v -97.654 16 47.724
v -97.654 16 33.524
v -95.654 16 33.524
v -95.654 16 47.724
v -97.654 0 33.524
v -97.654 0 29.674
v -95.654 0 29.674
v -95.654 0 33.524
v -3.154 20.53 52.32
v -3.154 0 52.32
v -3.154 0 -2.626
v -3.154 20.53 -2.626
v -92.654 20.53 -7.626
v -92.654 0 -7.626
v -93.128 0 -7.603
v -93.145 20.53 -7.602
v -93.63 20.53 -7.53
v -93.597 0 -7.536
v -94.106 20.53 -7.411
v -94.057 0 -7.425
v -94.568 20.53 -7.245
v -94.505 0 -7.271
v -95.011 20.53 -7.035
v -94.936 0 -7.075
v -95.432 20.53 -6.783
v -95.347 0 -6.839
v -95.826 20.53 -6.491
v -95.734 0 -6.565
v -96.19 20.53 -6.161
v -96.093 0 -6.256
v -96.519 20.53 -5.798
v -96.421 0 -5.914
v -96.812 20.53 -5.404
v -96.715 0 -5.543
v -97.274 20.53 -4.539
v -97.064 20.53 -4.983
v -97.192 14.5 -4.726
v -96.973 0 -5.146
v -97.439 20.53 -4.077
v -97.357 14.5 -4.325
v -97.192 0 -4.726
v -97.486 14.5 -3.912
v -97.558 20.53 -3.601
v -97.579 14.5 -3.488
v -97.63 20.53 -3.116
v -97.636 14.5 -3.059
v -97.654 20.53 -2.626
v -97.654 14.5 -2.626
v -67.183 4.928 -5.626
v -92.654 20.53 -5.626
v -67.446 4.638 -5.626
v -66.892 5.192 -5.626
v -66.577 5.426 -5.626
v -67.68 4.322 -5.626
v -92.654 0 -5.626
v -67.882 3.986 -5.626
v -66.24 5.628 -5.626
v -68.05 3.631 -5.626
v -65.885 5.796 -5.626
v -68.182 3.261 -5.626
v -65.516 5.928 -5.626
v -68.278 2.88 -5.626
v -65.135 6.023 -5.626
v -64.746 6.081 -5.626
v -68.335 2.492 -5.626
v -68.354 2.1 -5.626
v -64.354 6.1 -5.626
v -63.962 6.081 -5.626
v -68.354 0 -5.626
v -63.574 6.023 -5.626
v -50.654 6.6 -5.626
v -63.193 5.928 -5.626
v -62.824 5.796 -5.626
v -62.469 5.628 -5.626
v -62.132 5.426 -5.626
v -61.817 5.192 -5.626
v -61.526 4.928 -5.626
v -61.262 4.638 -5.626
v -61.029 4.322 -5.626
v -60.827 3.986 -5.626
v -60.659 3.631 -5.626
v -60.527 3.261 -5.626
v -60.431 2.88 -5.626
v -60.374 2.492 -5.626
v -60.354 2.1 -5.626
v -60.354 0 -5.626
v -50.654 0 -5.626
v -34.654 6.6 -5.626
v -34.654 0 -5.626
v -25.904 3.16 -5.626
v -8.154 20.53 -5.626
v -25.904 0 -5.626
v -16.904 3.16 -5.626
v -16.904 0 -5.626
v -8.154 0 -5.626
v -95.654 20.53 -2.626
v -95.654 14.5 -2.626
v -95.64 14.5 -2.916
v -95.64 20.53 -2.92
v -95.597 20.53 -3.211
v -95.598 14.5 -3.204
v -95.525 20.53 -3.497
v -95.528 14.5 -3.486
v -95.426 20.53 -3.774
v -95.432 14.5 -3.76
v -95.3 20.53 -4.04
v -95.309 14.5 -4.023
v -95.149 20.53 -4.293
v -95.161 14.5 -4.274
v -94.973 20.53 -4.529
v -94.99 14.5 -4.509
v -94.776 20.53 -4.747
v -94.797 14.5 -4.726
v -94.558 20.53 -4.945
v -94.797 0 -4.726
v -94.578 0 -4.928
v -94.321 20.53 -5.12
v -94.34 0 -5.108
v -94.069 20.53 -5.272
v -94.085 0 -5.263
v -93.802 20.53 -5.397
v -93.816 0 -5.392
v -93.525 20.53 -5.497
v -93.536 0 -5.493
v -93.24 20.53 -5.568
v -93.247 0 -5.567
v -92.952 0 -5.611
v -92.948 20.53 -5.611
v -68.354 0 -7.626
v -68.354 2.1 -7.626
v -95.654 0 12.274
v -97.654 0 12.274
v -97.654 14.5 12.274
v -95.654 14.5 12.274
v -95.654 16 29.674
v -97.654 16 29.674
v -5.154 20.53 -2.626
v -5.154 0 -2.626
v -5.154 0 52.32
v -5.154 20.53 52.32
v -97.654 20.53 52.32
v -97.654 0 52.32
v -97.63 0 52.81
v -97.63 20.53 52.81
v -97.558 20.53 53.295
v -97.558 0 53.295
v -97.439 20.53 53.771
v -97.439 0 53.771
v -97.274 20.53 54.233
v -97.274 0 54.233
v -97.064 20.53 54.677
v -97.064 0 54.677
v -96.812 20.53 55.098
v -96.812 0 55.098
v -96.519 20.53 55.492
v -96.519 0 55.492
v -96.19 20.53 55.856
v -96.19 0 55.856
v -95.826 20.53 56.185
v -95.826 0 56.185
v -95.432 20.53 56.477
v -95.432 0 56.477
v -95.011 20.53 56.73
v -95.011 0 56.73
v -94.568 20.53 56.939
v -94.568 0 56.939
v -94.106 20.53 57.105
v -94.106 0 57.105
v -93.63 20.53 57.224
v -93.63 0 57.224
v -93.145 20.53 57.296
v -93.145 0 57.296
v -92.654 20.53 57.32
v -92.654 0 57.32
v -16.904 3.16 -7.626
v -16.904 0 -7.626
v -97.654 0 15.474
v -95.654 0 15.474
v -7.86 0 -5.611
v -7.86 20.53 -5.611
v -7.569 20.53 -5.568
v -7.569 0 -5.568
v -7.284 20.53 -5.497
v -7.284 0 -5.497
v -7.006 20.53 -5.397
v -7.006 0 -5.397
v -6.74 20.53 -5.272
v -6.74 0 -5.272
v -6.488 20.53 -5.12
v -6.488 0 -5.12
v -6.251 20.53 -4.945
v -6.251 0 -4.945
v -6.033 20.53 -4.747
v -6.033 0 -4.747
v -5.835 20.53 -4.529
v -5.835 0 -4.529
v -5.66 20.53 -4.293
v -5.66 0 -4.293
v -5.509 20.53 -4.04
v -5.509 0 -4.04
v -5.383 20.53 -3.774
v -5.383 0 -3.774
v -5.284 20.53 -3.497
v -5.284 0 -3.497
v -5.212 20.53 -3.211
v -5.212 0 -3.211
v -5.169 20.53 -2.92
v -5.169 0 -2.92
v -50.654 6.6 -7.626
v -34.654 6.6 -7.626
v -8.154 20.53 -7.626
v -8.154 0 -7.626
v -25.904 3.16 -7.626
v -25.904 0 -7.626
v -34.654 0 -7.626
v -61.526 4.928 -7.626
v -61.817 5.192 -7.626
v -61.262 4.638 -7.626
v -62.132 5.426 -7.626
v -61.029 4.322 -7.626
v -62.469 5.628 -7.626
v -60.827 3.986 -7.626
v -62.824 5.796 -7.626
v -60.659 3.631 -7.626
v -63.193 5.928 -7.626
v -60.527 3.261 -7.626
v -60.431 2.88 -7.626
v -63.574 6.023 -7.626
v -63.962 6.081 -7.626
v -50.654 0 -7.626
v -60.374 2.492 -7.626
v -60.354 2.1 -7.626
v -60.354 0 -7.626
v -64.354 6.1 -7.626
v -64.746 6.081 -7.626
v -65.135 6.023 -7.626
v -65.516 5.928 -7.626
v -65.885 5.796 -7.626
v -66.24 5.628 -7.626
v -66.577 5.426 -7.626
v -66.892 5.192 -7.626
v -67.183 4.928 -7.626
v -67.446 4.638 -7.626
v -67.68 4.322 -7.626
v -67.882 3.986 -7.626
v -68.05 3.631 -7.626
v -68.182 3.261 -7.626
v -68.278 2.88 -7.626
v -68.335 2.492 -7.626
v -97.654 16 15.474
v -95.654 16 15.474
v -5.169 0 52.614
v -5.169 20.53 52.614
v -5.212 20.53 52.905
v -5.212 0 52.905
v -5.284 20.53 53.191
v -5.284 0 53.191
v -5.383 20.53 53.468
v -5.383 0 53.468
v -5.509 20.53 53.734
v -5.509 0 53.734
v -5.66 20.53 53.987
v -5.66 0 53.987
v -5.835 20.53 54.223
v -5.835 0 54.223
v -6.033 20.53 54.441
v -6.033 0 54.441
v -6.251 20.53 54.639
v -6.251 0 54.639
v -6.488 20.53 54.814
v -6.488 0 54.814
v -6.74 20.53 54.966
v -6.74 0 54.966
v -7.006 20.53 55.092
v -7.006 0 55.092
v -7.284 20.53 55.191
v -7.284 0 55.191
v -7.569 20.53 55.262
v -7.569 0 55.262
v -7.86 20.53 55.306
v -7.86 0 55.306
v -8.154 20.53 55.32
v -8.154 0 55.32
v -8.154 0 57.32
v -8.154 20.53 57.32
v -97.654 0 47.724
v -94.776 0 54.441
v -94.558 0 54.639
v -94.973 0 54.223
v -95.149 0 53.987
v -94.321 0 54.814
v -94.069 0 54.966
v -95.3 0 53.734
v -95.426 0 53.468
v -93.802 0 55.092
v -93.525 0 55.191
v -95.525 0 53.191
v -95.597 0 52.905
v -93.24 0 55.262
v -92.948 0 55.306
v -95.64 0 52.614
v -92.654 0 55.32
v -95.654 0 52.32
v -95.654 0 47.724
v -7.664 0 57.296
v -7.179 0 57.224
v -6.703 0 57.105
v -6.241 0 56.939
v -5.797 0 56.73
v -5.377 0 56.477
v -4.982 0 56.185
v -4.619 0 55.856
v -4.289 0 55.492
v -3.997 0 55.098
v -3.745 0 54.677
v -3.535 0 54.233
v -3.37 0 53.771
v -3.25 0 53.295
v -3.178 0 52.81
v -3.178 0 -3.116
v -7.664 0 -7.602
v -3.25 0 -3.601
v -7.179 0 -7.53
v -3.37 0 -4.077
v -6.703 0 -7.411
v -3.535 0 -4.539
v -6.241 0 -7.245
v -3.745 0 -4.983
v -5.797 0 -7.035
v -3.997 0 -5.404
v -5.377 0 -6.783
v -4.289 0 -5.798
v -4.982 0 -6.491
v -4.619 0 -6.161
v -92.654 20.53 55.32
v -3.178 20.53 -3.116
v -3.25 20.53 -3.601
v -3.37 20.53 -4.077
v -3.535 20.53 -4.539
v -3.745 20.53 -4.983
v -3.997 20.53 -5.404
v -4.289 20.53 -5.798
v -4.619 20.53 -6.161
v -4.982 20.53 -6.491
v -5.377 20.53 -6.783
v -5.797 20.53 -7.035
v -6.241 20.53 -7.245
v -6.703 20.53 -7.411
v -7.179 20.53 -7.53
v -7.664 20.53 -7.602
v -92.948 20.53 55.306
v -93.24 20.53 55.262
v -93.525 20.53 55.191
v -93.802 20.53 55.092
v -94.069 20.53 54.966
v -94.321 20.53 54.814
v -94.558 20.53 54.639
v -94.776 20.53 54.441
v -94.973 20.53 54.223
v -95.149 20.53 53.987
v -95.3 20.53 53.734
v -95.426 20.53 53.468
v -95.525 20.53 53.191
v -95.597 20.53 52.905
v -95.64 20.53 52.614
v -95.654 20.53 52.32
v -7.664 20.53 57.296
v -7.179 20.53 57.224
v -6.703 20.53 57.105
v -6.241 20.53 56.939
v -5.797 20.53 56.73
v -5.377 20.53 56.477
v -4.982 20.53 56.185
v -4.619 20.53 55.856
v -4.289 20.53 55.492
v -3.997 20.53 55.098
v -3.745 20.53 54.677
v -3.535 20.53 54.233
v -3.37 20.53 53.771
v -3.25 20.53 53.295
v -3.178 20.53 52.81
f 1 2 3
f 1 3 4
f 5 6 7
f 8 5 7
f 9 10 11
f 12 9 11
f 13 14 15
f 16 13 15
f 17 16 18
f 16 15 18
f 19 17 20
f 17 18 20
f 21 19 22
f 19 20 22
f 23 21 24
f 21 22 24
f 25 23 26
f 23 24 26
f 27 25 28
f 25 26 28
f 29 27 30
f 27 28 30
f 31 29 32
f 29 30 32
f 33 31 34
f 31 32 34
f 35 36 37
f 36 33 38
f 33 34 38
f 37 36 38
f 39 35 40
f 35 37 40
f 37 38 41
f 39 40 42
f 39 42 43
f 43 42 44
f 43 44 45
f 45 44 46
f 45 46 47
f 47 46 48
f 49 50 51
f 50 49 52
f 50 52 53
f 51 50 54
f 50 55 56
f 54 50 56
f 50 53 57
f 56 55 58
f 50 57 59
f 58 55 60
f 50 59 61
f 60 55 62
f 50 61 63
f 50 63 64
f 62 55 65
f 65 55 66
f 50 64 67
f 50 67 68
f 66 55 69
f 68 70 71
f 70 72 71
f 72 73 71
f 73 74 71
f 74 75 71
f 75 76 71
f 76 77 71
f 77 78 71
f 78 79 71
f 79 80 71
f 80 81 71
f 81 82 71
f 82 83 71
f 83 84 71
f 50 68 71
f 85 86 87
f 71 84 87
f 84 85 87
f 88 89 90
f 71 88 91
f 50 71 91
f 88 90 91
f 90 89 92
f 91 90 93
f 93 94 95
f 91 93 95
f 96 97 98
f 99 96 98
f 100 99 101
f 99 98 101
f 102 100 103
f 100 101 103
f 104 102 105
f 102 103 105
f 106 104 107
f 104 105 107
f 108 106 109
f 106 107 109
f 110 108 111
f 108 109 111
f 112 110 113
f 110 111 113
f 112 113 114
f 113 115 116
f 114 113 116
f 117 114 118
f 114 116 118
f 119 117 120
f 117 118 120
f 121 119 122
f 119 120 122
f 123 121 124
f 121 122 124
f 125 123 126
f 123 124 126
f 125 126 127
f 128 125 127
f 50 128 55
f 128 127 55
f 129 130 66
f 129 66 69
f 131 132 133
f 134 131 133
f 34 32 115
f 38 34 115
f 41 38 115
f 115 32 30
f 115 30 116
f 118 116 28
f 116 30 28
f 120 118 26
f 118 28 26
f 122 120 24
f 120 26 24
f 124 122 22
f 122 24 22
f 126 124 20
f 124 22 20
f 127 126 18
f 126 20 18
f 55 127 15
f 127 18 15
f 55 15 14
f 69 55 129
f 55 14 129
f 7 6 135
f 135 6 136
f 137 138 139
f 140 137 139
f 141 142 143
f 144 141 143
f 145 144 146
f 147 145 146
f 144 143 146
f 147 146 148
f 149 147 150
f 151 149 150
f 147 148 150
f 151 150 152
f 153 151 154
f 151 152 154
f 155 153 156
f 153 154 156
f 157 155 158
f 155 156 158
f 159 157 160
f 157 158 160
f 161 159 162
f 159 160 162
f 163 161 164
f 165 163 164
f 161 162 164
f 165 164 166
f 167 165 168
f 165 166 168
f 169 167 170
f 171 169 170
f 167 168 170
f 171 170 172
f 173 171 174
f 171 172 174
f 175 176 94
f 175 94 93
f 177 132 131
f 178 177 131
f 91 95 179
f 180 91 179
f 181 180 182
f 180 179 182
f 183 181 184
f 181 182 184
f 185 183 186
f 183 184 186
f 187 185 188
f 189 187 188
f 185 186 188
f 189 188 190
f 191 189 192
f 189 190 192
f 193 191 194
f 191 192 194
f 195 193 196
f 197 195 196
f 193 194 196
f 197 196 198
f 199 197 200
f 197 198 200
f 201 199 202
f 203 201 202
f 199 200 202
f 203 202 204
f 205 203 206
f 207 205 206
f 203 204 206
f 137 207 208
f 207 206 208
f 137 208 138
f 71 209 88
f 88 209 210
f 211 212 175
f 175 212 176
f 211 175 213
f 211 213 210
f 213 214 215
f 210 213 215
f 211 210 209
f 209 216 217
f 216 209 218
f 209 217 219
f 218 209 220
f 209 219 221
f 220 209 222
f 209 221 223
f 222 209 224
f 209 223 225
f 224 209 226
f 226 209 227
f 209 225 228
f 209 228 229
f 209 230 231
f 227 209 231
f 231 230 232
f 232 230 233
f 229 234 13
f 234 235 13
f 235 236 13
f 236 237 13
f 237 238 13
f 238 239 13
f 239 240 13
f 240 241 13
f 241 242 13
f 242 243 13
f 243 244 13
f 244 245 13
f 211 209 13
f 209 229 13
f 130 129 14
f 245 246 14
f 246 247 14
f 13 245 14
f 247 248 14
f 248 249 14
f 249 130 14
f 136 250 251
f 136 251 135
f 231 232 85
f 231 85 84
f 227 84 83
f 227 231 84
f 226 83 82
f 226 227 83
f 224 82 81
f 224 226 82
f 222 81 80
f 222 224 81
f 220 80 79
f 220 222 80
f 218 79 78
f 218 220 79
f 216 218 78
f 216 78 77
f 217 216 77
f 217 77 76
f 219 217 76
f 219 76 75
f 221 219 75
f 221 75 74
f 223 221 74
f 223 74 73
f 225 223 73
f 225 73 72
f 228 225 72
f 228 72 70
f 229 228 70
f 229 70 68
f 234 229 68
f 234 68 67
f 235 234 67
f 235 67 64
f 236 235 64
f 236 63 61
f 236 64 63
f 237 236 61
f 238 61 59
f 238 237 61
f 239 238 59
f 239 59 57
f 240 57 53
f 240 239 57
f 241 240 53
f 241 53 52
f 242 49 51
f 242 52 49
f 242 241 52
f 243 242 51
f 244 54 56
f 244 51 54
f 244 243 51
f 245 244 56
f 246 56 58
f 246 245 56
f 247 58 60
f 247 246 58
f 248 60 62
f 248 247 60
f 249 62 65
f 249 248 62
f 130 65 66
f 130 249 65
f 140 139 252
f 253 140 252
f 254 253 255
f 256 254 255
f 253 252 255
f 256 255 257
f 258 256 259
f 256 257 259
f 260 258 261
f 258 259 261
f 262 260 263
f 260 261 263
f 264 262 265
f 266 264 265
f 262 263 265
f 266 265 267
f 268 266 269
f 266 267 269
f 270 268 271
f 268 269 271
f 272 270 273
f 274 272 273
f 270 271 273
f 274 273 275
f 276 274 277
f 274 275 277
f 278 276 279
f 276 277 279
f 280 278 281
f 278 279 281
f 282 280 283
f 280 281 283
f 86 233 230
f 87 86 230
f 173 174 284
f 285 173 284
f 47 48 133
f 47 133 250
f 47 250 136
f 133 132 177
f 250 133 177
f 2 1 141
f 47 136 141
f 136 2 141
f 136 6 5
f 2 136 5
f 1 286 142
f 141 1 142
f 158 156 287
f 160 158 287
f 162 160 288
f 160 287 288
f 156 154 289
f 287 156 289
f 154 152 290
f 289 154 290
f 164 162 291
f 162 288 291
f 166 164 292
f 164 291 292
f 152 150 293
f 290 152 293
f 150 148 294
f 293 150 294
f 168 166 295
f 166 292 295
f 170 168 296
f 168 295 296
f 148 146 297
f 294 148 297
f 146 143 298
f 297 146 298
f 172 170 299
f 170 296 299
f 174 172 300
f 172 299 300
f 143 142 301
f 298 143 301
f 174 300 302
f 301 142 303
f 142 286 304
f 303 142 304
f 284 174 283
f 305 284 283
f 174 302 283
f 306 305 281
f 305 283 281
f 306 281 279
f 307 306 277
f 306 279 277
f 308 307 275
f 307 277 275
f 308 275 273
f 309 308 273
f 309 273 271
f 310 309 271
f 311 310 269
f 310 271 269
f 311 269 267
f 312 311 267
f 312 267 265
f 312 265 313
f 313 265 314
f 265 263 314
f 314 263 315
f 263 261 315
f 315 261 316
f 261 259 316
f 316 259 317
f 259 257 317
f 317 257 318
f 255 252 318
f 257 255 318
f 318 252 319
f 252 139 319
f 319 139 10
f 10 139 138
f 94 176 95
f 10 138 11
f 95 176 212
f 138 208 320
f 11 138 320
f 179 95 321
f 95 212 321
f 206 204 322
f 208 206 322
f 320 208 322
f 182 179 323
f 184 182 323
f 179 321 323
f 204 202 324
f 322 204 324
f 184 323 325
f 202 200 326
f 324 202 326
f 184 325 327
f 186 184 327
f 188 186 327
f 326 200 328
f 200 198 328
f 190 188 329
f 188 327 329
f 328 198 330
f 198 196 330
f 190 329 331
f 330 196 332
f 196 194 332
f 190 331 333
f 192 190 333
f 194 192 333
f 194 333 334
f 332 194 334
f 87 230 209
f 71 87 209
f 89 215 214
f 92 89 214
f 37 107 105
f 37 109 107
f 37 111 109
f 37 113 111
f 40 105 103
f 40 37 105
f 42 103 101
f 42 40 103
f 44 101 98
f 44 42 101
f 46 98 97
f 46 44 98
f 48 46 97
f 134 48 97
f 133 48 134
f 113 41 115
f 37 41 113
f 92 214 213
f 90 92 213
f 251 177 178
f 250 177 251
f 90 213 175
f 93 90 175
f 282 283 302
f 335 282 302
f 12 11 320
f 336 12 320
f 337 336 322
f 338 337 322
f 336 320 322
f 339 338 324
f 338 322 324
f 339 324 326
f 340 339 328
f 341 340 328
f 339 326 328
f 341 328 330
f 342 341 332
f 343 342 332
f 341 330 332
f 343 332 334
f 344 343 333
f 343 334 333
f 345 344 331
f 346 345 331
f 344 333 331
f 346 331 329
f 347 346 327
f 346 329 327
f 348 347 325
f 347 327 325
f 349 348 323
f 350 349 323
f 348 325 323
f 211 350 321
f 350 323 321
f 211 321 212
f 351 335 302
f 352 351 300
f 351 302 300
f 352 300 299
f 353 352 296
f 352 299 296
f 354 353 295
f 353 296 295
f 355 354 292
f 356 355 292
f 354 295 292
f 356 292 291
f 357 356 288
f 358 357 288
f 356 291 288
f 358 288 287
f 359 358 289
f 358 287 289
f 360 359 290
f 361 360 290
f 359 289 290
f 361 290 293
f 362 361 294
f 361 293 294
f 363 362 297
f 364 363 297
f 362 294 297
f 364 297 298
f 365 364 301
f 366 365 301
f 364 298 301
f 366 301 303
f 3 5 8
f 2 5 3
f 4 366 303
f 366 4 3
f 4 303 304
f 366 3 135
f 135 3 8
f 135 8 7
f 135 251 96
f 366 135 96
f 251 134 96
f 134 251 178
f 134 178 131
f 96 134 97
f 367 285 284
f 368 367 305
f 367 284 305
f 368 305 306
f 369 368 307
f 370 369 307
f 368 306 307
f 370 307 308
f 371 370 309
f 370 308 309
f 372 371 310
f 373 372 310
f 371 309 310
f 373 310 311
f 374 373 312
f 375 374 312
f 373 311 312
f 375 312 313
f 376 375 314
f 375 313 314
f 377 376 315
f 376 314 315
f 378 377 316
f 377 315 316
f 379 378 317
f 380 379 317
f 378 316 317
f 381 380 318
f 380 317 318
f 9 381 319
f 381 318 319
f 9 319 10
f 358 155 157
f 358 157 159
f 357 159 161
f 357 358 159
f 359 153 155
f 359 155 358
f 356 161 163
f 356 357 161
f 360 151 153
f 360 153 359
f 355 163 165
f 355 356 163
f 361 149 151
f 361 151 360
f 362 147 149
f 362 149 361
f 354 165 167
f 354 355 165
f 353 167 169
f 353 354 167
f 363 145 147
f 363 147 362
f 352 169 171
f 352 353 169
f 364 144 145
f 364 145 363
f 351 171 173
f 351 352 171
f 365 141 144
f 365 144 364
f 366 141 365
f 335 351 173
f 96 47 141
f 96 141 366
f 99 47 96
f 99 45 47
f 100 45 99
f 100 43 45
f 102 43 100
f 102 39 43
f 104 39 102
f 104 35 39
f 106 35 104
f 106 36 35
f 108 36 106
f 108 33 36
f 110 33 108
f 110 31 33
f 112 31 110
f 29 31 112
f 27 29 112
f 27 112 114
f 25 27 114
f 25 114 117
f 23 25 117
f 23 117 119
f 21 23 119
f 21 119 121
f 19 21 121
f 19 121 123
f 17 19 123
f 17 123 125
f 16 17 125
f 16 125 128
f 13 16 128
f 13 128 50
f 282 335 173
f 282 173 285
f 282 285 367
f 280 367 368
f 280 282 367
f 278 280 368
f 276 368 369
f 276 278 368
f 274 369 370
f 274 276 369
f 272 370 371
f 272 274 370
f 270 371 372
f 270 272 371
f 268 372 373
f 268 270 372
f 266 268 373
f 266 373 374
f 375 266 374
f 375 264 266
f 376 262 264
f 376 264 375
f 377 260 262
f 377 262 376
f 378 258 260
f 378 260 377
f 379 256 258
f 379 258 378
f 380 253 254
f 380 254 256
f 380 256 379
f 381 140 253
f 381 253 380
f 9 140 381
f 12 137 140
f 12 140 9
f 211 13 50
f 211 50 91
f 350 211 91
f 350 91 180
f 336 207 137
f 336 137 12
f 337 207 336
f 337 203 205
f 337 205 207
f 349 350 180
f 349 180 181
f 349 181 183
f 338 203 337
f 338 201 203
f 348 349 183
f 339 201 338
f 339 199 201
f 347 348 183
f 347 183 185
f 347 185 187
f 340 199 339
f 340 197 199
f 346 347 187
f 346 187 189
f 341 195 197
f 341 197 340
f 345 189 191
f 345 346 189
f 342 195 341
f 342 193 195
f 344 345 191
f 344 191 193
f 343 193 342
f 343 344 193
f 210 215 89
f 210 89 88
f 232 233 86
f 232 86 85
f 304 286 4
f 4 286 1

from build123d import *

# Parameters (mm, degrees)
BOSS_EXTRUDE1_DEPTH = 20.53
CUT_EXTRUDE1_REACH  = 112.841
SKETCH2_W           = 17
SKETCH2_H           = 14.5
SKETCH2_W_2         = 14.2
SKETCH2_H_2         = 16
CUT_EXTRUDE2_REACH  = 121.062
SKETCH3_W           = 9
SKETCH3_H           = 3.16
SKETCH3_W_2         = 16
SKETCH3_H_2         = 6.6


with BuildPart() as part:
    # Sketch1 → Boss-Extrude1 (new body)
    with BuildSketch(Plane(origin=(0, 0, 0), x_dir=(1, 0, 0), z_dir=(0, 1, 0))):
        with BuildLine():
            Line((-97.654422032, 2.625826009), (-97.654422032, -52.319988394))
            ThreePointArc((-97.654422032, -52.319988394), (-96.189955938, -55.8555223), (-92.654422032, -57.319988394))
            Line((-92.654422032, -57.319988394), (-8.154422032, -57.319988394))
            ThreePointArc((-8.154422032, -57.319988394), (-4.618888126, -55.8555223), (-3.154422032, -52.319988394))
            Line((-3.154422032, -52.319988394), (-3.154422032, 2.625826009))
            ThreePointArc((-3.154422032, 2.625826009), (-4.618888126, 6.161359915), (-8.154422032, 7.625826009))
            Line((-8.154422032, 7.625826009), (-92.654422032, 7.625826009))
            ThreePointArc((-92.654422032, 7.625826009), (-96.189955938, 6.161359915), (-97.654422032, 2.625826009))
        make_face()
        with BuildLine():
            Line((-92.654422032, 5.625826009), (-8.154422032, 5.625826009))
            ThreePointArc((-8.154422032, 5.625826009), (-6.033101689, 4.747146353), (-5.154422032, 2.625826009))
            Line((-5.154422032, 2.625826009), (-5.154422032, -52.319988394))
            ThreePointArc((-5.154422032, -52.319988394), (-6.033101689, -54.441308738), (-8.154422032, -55.319988394))
            Line((-8.154422032, -55.319988394), (-92.654422032, -55.319988394))
            ThreePointArc((-92.654422032, -55.319988394), (-94.775742376, -54.441308738), (-95.654422032, -52.319988394))
            Line((-95.654422032, -52.319988394), (-95.654422032, 2.625826009))
            ThreePointArc((-95.654422032, 2.625826009), (-94.775742376, 4.747146353), (-92.654422032, 5.625826009))
        make_face(mode=Mode.SUBTRACT)
    extrude(amount=BOSS_EXTRUDE1_DEPTH)

    # Sketch2 → Cut-Extrude1 (cut, up to next)
    with BuildSketch(Plane(origin=(-97.654422032, 0, 3.154422032), x_dir=(0, 0, 1), z_dir=(-1, 0, 0)), mode=Mode.PRIVATE) as cut_extrude1_sk1:
        with Locations((0.619751959, 7.25)):
            Rectangle(SKETCH2_W, SKETCH2_H)
    cut_extrude1_tool1 = extrude(cut_extrude1_sk1.sketch, amount=-CUT_EXTRUDE1_REACH, mode=Mode.PRIVATE) & part.part
    # Sketch2 → Cut-Extrude1 (cut, up to next)
    with BuildSketch(Plane(origin=(-97.654422032, 0, 3.154422032), x_dir=(0, 0, 1), z_dir=(-1, 0, 0)), mode=Mode.PRIVATE) as cut_extrude1_sk2:
        with Locations((19.419751959, 8)):
            Rectangle(SKETCH2_W_2, SKETCH2_H_2)
    cut_extrude1_tool2 = extrude(cut_extrude1_sk2.sketch, amount=-CUT_EXTRUDE1_REACH, mode=Mode.PRIVATE) & part.part
    # Sketch2 → Cut-Extrude1 (cut, up to next)
    with BuildSketch(Plane(origin=(-97.654422032, 0, 3.154422032), x_dir=(0, 0, 1), z_dir=(-1, 0, 0)), mode=Mode.PRIVATE) as cut_extrude1_sk3:
        with Locations((37.469751959, 8)):
            Rectangle(SKETCH2_W_2, SKETCH2_H_2)
    cut_extrude1_tool3 = extrude(cut_extrude1_sk3.sketch, amount=-CUT_EXTRUDE1_REACH, mode=Mode.PRIVATE) & part.part
    add(cut_extrude1_tool1.solids().sort_by_distance((-97.654422, 7.25, 3.774174))[0], mode=Mode.SUBTRACT)
    add(cut_extrude1_tool2.solids().sort_by_distance((-97.654422, 8, 22.574174))[0], mode=Mode.SUBTRACT)
    add(cut_extrude1_tool3.solids().sort_by_distance((-97.654422, 8, 40.624174))[0], mode=Mode.SUBTRACT)

    # Sketch3 → Cut-Extrude2 (cut, up to next)
    with BuildSketch(Plane.XY.offset(-7.625826009), mode=Mode.PRIVATE) as cut_extrude2_sk1:
        with Locations((-21.404422032, 1.58)):
            Rectangle(SKETCH3_W, SKETCH3_H)
    cut_extrude2_tool1 = extrude(cut_extrude2_sk1.sketch, amount=CUT_EXTRUDE2_REACH, mode=Mode.PRIVATE) & part.part
    # Sketch3 → Cut-Extrude2 (cut, up to next)
    with BuildSketch(Plane.XY.offset(-7.625826009), mode=Mode.PRIVATE) as cut_extrude2_sk2:
        with Locations((-42.654422032, 3.3)):
            Rectangle(SKETCH3_W_2, SKETCH3_H_2)
    cut_extrude2_tool2 = extrude(cut_extrude2_sk2.sketch, amount=CUT_EXTRUDE2_REACH, mode=Mode.PRIVATE) & part.part
    # Sketch3 → Cut-Extrude2 (cut, up to next)
    with BuildSketch(Plane.XY.offset(-7.625826009), mode=Mode.PRIVATE) as cut_extrude2_sk3:
        with BuildLine():
            Line((-68.354422032, 0), (-60.354422032, 0))
            Line((-60.354422032, 0), (-60.354422032, 2.1))
            ThreePointArc((-60.354422032, 2.1), (-64.354422032, 6.1), (-68.354422032, 2.1))
            Line((-68.354422032, 2.1), (-68.354422032, 0))
        make_face()
    cut_extrude2_tool3 = extrude(cut_extrude2_sk3.sketch, amount=CUT_EXTRUDE2_REACH, mode=Mode.PRIVATE) & part.part
    add(cut_extrude2_tool1.solids().sort_by_distance((-21.404422, 1.58, -7.625826))[0], mode=Mode.SUBTRACT)
    add(cut_extrude2_tool2.solids().sort_by_distance((-42.654422, 3.3, -7.625826))[0], mode=Mode.SUBTRACT)
    add(cut_extrude2_tool3.solids().sort_by_distance((-64.354422, 2.696829, -7.625826))[0], mode=Mode.SUBTRACT)


solid = part.part
